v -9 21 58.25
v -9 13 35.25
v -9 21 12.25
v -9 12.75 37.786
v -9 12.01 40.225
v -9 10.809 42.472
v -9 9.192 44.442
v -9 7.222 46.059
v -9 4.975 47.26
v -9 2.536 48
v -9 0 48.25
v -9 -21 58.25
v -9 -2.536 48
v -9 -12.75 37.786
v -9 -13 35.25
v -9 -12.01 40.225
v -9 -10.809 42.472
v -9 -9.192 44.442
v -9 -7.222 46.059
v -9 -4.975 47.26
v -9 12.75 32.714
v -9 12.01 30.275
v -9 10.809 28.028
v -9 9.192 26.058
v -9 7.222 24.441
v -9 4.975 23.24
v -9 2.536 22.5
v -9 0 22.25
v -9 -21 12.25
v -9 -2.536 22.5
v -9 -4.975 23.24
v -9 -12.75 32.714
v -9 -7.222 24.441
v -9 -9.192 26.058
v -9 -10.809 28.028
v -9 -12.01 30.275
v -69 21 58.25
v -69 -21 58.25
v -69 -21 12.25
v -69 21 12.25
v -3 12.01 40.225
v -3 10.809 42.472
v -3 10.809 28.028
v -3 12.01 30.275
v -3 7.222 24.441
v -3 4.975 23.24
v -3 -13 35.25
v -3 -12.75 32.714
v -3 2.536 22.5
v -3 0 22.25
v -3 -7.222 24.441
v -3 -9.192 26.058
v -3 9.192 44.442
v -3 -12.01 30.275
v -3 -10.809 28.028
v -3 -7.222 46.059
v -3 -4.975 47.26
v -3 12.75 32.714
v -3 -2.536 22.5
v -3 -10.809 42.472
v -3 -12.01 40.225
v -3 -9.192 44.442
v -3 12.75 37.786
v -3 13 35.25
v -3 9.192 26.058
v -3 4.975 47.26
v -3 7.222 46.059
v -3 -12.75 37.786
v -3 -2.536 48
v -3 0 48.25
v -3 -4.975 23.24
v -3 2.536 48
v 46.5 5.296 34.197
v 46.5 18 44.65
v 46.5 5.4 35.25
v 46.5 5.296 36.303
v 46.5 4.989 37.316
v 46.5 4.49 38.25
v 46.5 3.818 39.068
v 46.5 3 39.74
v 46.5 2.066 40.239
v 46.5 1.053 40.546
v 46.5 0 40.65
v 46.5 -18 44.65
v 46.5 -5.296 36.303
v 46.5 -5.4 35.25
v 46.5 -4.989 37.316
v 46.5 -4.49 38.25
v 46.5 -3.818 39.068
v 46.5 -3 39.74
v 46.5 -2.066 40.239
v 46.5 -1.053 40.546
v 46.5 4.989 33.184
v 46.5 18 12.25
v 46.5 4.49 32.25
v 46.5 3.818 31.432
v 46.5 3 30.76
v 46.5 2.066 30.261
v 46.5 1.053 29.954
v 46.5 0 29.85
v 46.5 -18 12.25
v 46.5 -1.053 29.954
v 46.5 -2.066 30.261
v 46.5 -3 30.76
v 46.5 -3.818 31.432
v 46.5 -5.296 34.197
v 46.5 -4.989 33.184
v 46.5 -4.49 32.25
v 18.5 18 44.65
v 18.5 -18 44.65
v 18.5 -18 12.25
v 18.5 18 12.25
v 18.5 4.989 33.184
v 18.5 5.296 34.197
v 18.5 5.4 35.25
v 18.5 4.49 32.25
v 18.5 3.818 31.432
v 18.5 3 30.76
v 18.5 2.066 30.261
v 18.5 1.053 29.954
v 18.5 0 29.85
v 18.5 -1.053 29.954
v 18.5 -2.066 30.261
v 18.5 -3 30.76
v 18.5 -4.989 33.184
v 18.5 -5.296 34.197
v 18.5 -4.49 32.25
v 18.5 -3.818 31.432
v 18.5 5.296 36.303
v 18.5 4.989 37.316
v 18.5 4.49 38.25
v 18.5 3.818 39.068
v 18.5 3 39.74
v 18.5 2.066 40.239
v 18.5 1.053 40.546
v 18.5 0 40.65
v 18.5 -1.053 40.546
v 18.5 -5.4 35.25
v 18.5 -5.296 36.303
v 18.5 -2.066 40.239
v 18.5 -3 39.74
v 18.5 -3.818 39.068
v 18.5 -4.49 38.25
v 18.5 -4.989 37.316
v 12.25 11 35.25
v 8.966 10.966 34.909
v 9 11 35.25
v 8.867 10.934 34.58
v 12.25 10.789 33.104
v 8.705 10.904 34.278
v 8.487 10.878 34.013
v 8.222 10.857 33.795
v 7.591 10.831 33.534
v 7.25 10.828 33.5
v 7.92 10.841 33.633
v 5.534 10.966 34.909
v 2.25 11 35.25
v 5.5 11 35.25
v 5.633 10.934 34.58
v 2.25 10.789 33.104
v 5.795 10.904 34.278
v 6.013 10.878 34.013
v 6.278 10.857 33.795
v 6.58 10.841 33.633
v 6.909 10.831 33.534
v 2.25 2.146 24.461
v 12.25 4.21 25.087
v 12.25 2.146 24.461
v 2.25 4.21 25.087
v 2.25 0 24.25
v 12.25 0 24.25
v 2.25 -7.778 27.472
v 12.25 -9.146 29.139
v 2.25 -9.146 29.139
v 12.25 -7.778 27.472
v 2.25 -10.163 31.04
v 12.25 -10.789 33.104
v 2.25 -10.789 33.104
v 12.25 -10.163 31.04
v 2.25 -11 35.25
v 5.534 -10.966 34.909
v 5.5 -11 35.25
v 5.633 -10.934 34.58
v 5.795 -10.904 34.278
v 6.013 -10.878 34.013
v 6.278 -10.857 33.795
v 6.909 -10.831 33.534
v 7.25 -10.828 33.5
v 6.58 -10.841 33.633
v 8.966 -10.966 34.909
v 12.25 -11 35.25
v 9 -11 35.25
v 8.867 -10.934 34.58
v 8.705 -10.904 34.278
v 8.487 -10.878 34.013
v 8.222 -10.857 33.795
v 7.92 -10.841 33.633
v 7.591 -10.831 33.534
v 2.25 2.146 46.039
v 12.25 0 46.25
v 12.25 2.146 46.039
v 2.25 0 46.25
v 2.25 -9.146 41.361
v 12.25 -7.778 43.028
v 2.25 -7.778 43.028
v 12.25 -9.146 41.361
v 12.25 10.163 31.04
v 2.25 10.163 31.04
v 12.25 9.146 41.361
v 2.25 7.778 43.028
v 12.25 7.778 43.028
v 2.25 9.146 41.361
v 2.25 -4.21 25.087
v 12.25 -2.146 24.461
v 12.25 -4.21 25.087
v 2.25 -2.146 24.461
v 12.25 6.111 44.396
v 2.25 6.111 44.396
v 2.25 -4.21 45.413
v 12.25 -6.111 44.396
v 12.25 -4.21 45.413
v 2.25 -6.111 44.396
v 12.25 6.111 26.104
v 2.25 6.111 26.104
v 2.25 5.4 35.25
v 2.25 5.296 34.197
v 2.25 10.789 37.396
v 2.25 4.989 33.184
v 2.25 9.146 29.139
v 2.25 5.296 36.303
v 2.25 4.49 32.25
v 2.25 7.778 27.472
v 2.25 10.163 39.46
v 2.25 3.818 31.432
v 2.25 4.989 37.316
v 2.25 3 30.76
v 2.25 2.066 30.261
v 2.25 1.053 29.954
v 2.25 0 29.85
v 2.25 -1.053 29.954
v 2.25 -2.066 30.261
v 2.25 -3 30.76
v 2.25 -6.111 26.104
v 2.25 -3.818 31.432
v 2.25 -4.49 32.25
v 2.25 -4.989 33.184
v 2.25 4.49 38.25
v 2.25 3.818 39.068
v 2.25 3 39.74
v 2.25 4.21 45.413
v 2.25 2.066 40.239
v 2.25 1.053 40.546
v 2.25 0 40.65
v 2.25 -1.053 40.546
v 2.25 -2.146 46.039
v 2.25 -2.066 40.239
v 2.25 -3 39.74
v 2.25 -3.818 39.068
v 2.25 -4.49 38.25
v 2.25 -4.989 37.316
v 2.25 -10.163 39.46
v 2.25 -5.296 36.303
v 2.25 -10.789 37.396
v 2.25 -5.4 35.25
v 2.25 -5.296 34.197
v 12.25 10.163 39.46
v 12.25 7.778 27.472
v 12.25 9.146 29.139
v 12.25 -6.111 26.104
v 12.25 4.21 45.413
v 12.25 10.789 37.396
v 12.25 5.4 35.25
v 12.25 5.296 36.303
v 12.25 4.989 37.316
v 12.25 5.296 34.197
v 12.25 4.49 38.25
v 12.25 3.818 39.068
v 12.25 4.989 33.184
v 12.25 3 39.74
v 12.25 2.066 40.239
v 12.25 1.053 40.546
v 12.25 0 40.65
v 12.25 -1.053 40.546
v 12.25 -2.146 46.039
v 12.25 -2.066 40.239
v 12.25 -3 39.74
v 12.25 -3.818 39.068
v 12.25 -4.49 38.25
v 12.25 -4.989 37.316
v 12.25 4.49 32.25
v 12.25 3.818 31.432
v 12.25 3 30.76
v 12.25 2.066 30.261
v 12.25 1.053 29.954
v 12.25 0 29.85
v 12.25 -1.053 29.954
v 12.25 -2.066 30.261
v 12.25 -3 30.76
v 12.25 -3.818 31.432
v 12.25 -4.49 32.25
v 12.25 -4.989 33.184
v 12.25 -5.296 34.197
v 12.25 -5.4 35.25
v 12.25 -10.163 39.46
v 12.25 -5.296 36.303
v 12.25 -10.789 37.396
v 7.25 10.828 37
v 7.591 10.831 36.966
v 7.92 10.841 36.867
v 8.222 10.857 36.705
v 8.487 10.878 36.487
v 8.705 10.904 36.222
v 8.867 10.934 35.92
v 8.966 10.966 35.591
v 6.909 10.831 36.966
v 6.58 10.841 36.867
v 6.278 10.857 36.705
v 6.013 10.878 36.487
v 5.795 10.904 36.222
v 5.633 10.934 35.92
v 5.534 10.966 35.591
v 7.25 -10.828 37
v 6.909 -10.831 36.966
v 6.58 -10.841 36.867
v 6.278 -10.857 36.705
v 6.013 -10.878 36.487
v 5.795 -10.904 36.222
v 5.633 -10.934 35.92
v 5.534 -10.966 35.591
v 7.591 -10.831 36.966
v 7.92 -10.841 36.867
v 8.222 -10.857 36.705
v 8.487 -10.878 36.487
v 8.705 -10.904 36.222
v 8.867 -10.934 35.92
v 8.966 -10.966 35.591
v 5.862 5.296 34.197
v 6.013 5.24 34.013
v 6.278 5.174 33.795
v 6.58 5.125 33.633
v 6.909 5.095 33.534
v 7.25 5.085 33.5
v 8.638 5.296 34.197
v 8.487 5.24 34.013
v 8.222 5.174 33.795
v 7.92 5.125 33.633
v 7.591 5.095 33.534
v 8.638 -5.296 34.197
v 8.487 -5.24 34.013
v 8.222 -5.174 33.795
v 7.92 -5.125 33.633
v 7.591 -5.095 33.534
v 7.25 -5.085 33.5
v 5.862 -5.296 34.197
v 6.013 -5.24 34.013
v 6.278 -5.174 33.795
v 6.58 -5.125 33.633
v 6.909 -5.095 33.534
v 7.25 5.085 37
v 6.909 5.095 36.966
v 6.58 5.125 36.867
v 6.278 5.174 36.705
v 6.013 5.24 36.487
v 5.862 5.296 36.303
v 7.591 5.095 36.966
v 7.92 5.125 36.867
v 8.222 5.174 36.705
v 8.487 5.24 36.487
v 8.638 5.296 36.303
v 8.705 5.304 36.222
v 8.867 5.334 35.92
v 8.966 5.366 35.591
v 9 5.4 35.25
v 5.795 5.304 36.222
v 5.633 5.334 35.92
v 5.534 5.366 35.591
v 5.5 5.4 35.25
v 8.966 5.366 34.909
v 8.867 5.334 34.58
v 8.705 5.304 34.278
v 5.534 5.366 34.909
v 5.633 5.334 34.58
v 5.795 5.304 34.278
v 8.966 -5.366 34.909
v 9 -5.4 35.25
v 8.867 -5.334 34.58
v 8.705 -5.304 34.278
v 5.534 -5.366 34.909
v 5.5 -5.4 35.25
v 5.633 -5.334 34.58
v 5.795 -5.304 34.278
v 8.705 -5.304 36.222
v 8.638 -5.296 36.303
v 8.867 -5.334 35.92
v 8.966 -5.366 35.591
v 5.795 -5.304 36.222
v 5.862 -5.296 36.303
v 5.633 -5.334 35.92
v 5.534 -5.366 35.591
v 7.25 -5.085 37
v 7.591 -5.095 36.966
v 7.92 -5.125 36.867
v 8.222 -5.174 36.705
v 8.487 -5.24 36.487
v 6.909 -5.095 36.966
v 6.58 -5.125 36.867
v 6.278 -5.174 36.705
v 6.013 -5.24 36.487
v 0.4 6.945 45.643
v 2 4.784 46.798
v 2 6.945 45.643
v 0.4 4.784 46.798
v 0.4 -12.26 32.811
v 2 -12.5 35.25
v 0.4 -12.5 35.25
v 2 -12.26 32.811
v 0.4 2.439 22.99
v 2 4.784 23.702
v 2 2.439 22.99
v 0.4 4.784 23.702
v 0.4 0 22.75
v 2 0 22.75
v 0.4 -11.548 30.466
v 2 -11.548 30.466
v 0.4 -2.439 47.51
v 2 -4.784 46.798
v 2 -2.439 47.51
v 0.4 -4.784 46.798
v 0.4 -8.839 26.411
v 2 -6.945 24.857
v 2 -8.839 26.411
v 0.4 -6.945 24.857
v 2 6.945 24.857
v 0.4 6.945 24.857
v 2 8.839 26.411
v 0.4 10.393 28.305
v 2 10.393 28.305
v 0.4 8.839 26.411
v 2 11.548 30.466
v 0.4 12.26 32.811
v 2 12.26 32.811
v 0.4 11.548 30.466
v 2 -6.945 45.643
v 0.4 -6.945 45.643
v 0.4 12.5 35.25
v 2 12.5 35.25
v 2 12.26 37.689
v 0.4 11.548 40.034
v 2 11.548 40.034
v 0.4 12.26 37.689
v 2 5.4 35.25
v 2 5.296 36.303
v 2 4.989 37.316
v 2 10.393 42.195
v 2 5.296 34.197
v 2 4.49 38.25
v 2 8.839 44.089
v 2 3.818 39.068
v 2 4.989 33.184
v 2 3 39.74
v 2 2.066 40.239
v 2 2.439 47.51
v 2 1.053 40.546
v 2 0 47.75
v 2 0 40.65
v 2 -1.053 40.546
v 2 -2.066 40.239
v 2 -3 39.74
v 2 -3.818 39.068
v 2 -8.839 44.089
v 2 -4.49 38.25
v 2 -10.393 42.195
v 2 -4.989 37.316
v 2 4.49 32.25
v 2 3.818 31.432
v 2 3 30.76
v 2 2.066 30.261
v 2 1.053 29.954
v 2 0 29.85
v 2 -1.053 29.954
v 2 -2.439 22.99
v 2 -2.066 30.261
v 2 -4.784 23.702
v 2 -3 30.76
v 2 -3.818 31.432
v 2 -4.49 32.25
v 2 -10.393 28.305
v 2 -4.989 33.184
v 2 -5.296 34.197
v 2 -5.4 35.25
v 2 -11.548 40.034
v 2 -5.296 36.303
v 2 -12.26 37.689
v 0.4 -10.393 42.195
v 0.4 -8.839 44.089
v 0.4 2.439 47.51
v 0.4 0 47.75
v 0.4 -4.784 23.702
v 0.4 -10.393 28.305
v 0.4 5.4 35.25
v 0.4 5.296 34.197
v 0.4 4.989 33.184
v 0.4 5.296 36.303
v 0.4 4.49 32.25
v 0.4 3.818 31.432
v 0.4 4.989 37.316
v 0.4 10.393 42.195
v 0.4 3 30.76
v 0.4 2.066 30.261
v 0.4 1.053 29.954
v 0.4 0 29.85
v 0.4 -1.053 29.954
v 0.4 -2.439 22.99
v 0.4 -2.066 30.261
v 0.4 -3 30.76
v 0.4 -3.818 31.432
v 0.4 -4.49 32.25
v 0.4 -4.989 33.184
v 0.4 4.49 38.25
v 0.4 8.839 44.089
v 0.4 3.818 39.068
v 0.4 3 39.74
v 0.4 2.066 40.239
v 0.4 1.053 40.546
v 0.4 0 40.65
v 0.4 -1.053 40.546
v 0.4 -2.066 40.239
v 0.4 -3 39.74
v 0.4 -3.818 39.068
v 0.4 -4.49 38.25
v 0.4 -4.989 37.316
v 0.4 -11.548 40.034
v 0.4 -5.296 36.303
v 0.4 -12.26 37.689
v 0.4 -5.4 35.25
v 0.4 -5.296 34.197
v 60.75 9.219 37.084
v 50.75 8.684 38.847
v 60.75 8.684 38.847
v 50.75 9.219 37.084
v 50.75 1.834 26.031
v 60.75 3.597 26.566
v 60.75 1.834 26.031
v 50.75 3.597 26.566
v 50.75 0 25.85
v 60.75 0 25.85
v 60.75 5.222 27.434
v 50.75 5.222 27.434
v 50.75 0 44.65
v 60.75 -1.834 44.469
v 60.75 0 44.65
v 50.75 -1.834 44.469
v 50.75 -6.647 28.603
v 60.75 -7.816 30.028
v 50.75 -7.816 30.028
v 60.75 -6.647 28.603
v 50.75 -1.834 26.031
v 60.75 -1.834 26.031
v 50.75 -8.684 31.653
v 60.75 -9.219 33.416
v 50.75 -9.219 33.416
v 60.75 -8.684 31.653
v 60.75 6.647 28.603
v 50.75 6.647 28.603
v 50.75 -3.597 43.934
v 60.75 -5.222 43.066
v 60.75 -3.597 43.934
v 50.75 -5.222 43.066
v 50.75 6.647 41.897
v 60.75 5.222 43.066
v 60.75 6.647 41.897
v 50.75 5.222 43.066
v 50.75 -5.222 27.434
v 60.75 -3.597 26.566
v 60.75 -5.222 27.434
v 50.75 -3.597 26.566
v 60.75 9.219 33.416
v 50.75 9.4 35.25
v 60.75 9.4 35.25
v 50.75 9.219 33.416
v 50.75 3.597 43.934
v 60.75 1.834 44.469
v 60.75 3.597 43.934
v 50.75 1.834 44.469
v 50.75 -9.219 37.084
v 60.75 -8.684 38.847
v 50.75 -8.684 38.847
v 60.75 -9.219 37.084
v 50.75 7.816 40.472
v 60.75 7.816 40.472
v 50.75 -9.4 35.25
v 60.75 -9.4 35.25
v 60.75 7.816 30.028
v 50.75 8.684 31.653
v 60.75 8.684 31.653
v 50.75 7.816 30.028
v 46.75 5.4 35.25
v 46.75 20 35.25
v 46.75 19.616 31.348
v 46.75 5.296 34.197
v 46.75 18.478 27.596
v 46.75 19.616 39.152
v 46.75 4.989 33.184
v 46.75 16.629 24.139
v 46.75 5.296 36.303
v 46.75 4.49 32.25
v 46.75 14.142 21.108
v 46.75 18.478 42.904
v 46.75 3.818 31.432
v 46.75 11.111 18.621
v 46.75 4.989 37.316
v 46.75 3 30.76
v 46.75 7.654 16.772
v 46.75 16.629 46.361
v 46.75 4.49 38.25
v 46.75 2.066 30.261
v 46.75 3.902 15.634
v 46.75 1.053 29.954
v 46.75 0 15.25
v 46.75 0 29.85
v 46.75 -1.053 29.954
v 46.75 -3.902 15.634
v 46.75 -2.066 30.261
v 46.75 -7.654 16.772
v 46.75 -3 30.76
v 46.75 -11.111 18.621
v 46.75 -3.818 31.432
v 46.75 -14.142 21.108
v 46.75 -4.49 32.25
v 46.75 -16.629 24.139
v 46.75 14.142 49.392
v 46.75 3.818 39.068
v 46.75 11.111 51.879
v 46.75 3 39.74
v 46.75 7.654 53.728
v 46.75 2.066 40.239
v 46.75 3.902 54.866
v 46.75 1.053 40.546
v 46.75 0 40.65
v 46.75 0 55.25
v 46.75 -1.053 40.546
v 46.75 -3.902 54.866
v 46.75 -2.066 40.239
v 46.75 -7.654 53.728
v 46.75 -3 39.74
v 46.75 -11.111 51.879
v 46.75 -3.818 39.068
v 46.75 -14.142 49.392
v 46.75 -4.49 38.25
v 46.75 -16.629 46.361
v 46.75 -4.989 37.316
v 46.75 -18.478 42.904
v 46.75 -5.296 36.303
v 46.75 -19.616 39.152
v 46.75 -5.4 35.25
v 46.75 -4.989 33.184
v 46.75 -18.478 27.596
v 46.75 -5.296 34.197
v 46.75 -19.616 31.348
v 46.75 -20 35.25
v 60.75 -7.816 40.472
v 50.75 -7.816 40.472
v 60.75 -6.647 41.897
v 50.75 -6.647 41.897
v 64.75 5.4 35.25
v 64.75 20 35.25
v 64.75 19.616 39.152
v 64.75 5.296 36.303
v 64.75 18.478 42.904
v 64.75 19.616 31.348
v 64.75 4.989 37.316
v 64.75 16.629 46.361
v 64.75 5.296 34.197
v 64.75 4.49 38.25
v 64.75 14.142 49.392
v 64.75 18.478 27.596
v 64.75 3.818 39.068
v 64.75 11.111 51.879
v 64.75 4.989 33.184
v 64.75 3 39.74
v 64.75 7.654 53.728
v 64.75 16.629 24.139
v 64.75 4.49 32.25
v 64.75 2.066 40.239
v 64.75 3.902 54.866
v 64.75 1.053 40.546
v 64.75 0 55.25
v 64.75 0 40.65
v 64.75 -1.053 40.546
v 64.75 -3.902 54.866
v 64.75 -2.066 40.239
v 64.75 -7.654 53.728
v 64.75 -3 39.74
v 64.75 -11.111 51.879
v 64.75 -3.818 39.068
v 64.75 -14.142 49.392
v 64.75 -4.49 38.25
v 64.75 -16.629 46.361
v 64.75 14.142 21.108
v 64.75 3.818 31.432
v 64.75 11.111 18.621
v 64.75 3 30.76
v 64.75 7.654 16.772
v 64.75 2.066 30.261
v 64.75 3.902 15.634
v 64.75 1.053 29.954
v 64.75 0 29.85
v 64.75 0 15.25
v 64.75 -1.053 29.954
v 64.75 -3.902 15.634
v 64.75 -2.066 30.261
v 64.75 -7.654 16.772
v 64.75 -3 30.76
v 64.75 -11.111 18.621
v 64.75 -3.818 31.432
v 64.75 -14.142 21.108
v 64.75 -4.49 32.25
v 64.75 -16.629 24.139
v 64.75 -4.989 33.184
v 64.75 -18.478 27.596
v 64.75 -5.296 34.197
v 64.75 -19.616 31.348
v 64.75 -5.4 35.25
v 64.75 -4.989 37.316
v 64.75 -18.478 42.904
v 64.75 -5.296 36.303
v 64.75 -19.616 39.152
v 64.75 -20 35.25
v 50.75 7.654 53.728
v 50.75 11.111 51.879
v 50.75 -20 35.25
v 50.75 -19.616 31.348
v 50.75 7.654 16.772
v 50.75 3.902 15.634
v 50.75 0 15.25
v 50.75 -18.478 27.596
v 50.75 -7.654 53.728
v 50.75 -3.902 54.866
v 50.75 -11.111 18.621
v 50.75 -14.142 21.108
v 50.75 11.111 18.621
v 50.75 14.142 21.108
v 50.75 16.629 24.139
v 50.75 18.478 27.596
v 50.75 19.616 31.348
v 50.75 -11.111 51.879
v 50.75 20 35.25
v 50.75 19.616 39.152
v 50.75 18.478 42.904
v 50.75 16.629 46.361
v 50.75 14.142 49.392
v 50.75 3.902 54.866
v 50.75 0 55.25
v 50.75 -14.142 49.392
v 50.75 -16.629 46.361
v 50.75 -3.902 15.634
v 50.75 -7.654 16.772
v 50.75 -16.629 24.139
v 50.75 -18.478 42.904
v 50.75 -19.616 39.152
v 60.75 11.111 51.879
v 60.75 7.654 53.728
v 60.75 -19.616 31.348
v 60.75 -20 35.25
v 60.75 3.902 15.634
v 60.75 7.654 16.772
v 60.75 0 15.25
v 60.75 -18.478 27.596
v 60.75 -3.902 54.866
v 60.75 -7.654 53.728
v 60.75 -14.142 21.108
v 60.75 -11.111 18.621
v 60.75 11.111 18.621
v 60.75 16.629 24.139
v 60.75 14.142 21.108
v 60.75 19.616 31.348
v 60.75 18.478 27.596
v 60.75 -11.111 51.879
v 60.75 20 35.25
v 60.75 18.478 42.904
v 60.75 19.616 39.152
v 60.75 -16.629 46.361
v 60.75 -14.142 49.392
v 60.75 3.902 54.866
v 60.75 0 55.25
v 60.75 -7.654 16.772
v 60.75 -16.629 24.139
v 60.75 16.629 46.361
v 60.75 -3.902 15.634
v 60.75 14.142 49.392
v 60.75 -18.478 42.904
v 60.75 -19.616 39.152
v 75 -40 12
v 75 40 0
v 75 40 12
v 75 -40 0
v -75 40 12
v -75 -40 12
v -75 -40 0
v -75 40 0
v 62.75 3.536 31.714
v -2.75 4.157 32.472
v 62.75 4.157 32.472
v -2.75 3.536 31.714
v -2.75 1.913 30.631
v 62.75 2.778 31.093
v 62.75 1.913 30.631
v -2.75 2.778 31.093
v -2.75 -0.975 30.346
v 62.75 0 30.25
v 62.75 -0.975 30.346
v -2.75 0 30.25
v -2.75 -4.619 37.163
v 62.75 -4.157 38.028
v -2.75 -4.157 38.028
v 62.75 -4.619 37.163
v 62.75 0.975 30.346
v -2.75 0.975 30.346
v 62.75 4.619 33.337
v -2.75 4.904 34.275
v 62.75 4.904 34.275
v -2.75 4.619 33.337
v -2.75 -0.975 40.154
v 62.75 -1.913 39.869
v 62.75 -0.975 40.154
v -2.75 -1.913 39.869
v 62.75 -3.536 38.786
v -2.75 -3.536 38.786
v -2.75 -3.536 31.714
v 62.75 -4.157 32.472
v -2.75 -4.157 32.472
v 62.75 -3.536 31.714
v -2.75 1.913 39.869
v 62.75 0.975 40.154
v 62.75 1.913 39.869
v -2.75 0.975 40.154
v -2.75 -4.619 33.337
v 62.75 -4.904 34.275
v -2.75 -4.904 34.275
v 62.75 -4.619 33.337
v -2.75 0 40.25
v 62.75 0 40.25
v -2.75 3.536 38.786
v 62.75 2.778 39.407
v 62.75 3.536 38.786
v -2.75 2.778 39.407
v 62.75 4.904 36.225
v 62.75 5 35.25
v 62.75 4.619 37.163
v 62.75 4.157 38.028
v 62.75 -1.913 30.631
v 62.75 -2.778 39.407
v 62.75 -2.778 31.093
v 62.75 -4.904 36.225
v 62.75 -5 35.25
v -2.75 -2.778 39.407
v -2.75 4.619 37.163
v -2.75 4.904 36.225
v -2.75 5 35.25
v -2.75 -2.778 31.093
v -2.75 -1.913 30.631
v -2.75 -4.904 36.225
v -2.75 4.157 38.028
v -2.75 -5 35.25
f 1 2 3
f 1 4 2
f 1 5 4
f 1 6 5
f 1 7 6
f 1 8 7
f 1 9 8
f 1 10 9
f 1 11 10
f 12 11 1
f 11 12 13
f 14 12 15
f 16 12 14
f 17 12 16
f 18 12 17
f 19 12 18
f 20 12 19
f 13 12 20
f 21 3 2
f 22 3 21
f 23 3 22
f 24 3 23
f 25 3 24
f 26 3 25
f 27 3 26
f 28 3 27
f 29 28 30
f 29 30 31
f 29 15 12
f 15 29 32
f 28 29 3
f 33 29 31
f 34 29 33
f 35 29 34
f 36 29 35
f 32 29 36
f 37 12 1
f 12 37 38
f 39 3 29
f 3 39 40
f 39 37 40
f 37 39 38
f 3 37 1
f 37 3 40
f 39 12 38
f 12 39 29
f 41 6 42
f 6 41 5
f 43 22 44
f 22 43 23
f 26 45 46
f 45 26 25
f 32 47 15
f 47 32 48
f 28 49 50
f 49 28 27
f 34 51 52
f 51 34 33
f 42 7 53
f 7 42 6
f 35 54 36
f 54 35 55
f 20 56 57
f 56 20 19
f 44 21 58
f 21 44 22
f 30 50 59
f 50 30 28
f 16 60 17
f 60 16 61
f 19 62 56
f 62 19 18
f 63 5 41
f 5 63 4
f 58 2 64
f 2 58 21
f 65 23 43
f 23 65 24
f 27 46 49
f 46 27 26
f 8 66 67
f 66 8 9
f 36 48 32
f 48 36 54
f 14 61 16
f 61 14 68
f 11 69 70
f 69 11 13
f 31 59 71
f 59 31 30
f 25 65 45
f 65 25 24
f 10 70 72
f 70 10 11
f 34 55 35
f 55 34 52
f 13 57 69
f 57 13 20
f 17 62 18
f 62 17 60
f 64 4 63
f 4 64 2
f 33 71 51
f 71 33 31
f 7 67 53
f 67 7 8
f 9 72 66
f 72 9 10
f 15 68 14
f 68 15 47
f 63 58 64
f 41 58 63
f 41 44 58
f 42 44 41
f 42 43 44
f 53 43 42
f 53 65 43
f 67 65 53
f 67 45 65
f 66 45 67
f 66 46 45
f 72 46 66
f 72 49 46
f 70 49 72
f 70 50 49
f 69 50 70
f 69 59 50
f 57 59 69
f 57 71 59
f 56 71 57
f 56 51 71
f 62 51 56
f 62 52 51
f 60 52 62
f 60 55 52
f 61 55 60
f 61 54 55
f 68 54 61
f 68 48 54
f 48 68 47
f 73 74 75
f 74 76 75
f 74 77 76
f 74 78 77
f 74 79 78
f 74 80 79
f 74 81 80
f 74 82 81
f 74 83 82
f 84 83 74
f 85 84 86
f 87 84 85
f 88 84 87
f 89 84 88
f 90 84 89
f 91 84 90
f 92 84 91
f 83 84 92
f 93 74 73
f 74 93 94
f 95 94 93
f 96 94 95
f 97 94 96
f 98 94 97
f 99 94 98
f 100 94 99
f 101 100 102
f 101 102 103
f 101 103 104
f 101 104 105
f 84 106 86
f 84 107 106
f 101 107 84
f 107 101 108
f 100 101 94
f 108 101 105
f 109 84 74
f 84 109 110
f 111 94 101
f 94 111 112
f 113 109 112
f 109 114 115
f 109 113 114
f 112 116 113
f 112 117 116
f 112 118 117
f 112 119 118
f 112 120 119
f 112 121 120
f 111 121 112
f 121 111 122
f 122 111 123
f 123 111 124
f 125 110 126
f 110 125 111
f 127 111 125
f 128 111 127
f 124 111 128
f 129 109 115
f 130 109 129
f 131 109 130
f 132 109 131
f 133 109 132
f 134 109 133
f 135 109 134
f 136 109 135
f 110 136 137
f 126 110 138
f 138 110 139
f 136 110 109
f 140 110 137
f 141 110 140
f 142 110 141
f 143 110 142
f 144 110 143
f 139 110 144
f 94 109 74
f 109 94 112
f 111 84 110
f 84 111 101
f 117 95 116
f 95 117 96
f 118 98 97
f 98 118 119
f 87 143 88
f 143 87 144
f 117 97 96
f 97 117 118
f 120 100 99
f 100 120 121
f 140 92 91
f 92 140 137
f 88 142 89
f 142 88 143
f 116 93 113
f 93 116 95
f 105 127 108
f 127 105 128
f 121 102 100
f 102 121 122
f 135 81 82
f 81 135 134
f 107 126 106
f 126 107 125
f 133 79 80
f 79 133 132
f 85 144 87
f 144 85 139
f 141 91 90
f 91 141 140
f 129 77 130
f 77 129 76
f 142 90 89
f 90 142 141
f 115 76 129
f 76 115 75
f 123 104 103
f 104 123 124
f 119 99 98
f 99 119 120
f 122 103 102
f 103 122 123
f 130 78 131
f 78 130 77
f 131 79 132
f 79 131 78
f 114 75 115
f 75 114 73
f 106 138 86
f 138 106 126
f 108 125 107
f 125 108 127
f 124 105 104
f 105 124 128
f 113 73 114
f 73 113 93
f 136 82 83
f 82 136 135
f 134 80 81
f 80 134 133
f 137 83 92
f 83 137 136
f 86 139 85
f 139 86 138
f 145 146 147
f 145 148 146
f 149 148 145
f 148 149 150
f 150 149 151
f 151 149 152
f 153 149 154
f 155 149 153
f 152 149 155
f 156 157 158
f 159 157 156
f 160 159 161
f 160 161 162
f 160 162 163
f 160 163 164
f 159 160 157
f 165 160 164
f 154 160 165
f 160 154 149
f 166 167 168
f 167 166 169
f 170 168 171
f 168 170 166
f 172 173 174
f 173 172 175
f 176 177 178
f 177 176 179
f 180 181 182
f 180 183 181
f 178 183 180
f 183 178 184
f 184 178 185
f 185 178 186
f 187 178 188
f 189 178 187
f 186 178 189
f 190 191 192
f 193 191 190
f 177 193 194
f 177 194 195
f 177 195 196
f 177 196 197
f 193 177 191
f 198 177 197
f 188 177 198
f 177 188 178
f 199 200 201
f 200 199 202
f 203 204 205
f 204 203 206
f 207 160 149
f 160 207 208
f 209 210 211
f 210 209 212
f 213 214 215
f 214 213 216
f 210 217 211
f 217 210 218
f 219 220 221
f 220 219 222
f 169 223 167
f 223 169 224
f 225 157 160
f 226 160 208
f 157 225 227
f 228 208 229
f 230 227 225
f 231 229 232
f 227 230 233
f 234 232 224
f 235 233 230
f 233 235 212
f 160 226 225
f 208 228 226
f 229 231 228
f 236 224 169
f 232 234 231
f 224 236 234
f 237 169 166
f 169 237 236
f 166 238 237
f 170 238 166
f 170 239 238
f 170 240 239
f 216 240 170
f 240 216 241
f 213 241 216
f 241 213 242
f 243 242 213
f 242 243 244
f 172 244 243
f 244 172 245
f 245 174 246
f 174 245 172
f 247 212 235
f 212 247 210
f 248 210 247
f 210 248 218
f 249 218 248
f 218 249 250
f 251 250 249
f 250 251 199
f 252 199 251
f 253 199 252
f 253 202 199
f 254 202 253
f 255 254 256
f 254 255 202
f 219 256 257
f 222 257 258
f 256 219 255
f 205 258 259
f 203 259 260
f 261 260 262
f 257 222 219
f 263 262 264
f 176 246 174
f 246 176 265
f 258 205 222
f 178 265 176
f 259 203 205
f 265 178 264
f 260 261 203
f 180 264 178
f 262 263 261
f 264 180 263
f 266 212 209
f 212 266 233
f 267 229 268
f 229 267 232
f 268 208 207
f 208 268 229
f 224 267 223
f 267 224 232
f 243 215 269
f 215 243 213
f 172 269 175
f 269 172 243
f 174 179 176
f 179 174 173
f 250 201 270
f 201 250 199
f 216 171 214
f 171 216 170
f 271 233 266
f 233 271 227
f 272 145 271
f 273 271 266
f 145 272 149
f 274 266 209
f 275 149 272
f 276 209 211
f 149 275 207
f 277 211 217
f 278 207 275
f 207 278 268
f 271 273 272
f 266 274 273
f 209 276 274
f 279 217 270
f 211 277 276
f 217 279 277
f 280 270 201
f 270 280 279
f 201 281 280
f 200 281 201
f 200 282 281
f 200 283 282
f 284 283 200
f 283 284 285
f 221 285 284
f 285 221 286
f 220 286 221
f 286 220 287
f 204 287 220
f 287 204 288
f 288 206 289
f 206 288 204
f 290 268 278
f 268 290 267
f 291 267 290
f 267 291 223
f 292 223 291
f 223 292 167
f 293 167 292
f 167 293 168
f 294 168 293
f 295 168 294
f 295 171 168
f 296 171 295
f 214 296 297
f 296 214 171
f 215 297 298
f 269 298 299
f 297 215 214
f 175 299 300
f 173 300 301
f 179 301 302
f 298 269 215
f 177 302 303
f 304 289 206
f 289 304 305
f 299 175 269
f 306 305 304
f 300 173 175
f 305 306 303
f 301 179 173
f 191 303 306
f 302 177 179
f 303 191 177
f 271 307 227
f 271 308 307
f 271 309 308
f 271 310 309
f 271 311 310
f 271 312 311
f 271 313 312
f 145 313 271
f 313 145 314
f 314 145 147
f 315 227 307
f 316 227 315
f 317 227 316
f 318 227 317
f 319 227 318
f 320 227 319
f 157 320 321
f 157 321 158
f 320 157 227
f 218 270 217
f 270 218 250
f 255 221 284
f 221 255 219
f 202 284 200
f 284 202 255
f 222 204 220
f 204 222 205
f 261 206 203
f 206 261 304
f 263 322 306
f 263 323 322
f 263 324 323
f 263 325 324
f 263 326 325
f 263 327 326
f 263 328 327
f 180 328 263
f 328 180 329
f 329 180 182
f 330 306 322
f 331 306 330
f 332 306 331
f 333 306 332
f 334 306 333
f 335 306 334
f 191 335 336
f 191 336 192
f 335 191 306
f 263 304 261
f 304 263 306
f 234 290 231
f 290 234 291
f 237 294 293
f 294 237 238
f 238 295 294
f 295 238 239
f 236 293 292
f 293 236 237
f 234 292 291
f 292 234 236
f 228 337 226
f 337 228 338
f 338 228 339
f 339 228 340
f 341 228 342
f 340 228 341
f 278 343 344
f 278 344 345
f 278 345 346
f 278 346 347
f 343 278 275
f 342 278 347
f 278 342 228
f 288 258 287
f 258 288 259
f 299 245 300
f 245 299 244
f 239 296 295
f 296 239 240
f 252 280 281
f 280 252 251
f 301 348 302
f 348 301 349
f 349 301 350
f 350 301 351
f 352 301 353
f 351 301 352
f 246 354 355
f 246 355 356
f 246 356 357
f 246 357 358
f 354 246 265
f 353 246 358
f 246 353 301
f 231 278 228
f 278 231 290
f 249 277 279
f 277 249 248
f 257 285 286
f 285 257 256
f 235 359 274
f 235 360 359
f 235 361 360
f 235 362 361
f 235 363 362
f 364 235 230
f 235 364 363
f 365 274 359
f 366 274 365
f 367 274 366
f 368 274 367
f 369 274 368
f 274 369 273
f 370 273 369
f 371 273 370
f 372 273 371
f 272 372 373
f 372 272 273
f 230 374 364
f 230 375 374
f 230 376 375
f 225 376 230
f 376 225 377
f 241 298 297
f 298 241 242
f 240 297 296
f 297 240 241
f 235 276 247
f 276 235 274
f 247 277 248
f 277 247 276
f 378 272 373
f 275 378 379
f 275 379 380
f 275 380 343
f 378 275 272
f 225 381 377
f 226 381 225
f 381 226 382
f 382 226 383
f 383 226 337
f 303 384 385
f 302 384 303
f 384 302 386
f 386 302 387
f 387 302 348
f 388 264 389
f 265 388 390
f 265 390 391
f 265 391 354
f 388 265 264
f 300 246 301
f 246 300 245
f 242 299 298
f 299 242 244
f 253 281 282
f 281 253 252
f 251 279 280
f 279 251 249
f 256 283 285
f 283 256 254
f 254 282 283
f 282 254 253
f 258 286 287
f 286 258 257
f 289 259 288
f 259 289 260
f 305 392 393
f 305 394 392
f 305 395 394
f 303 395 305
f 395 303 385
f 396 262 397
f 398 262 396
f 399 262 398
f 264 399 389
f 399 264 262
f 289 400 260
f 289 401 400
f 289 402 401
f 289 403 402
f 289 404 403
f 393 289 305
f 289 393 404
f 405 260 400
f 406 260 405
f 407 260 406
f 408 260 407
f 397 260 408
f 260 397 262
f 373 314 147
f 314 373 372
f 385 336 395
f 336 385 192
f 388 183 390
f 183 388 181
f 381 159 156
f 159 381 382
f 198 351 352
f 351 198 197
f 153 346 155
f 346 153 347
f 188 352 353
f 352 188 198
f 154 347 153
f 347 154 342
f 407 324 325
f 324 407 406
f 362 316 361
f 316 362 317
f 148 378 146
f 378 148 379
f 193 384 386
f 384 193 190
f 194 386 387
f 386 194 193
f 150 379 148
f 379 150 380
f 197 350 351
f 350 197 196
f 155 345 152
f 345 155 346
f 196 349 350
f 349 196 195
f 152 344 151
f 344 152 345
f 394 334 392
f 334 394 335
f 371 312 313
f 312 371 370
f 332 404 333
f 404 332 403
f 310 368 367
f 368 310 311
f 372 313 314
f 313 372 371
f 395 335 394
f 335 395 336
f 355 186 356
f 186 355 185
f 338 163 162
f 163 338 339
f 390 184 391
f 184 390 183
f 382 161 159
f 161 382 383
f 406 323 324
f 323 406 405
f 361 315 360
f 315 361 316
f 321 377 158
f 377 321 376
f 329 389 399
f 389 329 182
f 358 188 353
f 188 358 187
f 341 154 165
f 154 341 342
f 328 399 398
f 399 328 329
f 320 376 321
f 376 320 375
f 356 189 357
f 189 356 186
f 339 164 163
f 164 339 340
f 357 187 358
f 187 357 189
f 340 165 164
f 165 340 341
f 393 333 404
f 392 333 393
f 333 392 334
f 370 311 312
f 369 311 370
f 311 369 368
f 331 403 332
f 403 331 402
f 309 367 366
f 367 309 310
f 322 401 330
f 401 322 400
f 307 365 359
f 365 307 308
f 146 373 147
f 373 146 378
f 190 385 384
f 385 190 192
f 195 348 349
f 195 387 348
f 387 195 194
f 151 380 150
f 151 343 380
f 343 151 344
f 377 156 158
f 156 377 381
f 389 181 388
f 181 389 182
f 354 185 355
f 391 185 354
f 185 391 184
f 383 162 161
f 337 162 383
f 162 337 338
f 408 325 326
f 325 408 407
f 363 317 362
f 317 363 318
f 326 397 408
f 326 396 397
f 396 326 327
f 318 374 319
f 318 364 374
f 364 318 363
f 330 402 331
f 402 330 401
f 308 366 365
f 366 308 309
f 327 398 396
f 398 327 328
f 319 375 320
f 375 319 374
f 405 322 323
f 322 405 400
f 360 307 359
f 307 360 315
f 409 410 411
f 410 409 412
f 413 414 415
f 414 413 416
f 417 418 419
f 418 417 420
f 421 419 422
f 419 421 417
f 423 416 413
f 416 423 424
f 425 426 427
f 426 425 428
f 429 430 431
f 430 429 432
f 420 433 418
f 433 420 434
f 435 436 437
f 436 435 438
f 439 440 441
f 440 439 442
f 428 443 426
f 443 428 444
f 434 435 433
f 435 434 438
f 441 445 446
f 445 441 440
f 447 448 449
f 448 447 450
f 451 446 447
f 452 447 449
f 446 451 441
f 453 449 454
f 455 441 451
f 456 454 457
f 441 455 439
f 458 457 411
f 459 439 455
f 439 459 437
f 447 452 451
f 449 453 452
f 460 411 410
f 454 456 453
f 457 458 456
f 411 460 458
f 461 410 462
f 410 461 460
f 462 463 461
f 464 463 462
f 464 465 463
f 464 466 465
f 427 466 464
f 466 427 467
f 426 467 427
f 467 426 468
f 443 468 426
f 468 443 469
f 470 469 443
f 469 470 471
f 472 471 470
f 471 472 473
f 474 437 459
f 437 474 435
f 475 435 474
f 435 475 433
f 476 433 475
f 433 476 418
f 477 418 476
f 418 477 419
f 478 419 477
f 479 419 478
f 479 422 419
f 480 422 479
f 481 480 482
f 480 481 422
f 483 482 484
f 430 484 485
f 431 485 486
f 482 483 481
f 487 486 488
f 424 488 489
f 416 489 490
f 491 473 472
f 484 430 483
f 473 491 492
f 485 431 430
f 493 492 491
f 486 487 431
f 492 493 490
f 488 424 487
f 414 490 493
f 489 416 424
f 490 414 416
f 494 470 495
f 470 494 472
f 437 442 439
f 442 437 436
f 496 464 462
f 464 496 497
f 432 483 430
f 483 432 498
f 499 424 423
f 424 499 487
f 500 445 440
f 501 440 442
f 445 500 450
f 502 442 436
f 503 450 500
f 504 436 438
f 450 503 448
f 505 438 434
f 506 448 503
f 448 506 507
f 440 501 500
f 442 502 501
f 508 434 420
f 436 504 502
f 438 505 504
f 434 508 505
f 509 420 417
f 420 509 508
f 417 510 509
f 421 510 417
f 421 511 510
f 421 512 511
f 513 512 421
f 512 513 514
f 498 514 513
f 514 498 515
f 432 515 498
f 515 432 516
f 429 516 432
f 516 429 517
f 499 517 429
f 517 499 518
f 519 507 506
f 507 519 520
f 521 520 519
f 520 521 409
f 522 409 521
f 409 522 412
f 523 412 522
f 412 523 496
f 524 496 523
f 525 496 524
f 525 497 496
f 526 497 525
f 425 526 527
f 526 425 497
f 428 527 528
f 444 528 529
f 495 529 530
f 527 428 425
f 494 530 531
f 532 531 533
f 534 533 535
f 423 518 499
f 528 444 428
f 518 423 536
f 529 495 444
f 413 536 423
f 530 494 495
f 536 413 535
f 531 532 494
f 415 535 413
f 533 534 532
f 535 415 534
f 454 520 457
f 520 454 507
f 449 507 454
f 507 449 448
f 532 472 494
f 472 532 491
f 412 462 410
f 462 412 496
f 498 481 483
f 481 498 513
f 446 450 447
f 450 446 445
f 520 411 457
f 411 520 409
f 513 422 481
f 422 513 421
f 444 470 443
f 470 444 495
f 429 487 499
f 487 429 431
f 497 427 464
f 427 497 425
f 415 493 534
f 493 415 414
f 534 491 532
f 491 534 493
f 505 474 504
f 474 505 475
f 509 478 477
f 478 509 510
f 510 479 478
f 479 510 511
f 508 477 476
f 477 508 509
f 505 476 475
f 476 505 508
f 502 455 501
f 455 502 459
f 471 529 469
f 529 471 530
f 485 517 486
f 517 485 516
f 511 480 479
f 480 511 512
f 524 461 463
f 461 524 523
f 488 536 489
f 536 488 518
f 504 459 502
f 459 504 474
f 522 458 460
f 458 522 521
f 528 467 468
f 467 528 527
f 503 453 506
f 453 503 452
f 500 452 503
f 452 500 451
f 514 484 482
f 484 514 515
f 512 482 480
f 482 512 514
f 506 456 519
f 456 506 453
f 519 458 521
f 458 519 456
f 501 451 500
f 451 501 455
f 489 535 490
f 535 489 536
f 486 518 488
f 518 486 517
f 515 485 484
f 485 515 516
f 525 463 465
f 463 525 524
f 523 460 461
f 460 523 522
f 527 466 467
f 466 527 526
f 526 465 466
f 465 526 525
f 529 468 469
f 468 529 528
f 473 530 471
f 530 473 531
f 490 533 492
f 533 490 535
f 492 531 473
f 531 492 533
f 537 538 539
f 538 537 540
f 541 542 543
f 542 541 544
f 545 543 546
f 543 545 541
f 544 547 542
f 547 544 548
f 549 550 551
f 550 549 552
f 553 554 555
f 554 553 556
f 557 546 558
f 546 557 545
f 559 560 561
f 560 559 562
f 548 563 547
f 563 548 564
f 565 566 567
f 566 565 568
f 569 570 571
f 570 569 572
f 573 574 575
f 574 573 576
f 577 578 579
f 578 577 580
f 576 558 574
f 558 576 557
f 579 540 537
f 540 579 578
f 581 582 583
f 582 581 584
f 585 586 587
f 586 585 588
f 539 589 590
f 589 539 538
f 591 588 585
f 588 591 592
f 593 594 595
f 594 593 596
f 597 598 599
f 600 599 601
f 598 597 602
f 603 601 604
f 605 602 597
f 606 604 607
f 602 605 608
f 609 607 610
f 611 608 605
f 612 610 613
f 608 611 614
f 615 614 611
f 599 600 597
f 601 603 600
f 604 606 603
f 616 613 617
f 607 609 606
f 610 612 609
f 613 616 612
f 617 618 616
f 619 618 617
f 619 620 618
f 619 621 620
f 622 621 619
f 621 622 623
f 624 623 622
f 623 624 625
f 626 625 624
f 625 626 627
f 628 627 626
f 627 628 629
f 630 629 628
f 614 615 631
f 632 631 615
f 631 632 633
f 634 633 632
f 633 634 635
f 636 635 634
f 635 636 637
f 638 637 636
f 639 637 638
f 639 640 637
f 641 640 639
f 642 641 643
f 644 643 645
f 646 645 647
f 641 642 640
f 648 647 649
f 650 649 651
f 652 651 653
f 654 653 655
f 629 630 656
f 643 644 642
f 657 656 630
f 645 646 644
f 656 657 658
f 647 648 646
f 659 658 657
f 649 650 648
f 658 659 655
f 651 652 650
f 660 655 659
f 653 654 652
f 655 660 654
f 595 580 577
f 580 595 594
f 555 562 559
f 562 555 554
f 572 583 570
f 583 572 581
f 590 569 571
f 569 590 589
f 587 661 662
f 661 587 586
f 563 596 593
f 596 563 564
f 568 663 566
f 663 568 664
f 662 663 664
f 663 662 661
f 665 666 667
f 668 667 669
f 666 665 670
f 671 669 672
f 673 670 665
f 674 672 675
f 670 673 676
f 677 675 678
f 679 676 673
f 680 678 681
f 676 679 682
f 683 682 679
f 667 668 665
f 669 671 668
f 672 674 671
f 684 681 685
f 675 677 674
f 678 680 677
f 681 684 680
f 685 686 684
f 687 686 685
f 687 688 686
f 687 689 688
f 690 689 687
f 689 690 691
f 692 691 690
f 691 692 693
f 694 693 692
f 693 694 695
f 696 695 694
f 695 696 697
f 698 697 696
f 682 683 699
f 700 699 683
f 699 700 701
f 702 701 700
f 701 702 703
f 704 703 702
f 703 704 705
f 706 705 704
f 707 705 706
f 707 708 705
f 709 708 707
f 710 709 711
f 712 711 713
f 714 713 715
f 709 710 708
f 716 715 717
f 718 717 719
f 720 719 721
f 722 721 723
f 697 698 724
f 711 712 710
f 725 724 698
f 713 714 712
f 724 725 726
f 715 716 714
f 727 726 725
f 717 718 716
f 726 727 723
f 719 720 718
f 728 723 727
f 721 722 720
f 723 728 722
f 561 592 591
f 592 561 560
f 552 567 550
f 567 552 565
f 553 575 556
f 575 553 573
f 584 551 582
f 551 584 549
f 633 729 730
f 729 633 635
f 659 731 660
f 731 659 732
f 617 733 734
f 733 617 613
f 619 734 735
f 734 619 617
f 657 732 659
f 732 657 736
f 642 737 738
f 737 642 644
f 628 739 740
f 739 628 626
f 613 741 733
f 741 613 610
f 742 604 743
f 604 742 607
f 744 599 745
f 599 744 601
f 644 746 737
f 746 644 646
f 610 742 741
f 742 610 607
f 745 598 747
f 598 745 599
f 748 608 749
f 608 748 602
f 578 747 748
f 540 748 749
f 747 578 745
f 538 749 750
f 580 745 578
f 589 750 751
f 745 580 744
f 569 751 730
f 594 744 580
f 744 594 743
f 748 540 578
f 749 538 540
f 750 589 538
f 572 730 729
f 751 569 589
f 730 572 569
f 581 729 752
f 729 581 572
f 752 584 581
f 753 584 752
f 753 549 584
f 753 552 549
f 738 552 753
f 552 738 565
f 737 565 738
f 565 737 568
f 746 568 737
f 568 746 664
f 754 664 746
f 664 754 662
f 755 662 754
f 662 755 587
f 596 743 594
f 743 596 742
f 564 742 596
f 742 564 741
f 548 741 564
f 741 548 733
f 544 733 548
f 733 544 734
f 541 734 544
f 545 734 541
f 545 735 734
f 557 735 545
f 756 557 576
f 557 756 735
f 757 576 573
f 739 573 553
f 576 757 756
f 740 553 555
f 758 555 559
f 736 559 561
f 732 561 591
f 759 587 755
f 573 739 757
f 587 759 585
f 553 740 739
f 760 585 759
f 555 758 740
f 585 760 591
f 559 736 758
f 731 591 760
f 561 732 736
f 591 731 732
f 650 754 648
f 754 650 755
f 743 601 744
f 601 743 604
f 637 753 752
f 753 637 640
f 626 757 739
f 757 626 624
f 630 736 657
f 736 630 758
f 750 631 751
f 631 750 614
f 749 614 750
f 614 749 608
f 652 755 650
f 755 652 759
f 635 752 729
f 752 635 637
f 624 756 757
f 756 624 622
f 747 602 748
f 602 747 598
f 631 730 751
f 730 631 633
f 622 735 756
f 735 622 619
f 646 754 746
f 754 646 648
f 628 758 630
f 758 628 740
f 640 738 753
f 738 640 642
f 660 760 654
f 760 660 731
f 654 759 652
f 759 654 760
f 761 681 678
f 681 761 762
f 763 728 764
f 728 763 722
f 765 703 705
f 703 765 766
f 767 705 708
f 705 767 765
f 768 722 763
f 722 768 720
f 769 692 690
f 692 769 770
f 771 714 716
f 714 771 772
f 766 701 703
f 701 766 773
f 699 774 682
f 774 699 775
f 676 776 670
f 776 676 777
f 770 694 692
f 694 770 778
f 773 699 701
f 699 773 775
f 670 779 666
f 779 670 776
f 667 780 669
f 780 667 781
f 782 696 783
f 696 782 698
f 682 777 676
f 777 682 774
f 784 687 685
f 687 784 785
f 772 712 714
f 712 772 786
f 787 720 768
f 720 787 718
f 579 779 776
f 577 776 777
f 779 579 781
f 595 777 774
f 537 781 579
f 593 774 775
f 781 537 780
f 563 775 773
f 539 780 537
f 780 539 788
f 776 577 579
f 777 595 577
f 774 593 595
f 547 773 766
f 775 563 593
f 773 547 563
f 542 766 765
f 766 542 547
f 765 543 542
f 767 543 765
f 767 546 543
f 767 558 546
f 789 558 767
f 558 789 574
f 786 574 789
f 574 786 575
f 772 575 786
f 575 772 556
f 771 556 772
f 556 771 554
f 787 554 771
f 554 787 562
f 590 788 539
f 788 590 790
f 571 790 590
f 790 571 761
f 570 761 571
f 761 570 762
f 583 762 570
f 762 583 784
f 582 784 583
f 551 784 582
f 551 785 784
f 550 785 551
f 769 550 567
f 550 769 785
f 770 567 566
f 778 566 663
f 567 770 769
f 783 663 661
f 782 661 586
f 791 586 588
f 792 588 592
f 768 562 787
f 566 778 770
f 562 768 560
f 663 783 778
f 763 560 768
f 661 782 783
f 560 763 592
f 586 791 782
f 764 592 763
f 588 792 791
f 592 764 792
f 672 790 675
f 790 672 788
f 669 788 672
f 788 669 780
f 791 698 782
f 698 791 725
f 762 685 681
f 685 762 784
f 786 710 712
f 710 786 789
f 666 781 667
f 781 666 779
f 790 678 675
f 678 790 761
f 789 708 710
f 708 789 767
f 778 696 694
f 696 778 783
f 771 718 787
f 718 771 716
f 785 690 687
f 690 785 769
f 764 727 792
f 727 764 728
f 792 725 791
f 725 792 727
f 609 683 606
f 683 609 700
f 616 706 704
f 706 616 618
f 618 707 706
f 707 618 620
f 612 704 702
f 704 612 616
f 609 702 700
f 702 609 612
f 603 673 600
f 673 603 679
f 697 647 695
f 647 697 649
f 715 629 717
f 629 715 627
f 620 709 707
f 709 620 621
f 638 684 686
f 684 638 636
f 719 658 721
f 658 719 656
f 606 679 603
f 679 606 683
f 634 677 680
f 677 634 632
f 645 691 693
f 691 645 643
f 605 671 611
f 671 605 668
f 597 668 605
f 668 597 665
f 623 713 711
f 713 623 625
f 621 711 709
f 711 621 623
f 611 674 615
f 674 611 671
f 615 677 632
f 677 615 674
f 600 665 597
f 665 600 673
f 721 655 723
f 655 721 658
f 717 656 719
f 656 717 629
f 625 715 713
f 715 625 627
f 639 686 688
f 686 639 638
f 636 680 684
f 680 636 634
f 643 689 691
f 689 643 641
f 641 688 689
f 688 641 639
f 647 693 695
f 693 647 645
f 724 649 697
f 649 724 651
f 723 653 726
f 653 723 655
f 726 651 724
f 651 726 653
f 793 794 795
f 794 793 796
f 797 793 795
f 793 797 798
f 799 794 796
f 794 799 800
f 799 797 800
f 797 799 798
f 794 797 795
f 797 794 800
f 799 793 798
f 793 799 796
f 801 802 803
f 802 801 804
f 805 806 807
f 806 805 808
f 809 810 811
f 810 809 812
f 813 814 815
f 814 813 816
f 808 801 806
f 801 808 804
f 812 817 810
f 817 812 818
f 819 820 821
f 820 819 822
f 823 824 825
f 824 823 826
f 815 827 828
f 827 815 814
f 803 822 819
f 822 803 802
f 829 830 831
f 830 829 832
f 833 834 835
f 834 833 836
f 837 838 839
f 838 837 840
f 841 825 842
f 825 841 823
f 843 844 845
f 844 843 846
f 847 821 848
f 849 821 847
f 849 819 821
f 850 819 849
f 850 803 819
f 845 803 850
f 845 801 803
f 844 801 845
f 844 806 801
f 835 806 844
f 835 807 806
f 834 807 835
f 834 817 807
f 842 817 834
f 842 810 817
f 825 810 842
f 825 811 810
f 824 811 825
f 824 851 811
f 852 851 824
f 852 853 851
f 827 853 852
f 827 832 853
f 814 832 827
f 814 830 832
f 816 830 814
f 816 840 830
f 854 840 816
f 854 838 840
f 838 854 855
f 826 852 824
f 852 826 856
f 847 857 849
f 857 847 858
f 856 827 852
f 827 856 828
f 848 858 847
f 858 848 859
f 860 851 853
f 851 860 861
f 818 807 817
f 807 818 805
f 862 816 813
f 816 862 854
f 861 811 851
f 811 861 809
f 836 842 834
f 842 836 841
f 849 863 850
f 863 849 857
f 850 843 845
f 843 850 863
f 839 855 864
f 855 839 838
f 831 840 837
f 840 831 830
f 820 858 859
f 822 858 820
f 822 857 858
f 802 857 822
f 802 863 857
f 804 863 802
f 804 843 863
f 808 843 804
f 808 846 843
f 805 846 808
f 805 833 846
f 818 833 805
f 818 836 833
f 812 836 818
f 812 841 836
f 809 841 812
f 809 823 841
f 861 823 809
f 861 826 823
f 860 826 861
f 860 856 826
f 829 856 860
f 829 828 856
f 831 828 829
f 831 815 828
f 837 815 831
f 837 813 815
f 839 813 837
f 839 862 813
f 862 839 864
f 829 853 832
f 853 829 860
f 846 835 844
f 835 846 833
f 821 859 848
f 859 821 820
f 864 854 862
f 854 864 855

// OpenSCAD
$fn = 32;

// ------------------------------------------------------------------------
// Motor drive station: motor 60 x 46 mm, shaft d10, pulley d40
// Every part is its own module, assembly() places every instance.
// ------------------------------------------------------------------------

// --- part 1 ---
module station_bed() {
  difference() {
    translate([-75, -40, 0]) cube([150, 80, 12]);
  }
}

// --- part 2 ---
module drive_motor() {
  union() {
    translate([-30, -21, 0]) cube([60, 42, 46]);
    translate([33, 0, 23]) rotate([0, 90, 0]) cylinder(h = 6, d = 26, center = true);
  }
}

// --- part 3 ---
module pillow_block() {
  difference() {
    translate([-14, -18, 0]) cube([28, 36, 32.4]);
    translate([0, 0, 23]) rotate([0, 90, 0]) cylinder(h = 30, d = 10.8, center = true);
  }
}

// --- part 4 ---
module drive_shaft() {
  translate([0, 0, -32.75]) cylinder(h = 65.5, d = 10);
}

// --- part 5 ---
module shaft_collar() {
  difference() {
    cylinder(h = 10, d = 22);
    translate([0, 0, -1]) cylinder(h = 12, d = 10.8);
    translate([0, 0, 5]) rotate([90, 0, 0]) cylinder(h = 24, d = 3.5, center = true);
  }
}

// --- part 6 ---
module collar_washer() {
  difference() {
      translate([0, 0, 0]) cylinder(h = 1.6, d = 25);
      translate([0, 0, -1]) cylinder(h = 3.6, d = 10.8);
    }
}

// --- part 7 ---
module drive_pulley() {
  difference() {
    union() {
      cylinder(h = 18, d = 18.8);
      cylinder(h = 4, d = 40);
      translate([0, 0, 14]) cylinder(h = 4, d = 40);
    }
    translate([0, 0, -1]) cylinder(h = 20, d = 10.8);
  }
}

// --- assembly ---
module assembly() {
  color([0.80, 0.24, 0.20]) translate([0, 0, 0]) rotate([0, 0, 0]) station_bed();
  color([0.20, 0.45, 0.75]) translate([-39, 0, 12.25]) rotate([0, 0, 0]) drive_motor();
  color([0.25, 0.62, 0.32]) translate([32.5, 0, 12.25]) rotate([0, 0, 0]) pillow_block();
  color([0.92, 0.70, 0.18]) translate([30, 0, 35.25]) rotate([0, 90, 0]) drive_shaft();
  color([0.58, 0.35, 0.70]) translate([2.25, 0, 35.25]) rotate([0, 90, 0]) shaft_collar();
  color([0.16, 0.66, 0.66]) translate([0.4, 0, 35.25]) rotate([0, 90, 0]) collar_washer();
  color([0.85, 0.48, 0.18]) translate([46.75, 0, 35.25]) rotate([0, 90, 0]) drive_pulley();
}

assembly();
